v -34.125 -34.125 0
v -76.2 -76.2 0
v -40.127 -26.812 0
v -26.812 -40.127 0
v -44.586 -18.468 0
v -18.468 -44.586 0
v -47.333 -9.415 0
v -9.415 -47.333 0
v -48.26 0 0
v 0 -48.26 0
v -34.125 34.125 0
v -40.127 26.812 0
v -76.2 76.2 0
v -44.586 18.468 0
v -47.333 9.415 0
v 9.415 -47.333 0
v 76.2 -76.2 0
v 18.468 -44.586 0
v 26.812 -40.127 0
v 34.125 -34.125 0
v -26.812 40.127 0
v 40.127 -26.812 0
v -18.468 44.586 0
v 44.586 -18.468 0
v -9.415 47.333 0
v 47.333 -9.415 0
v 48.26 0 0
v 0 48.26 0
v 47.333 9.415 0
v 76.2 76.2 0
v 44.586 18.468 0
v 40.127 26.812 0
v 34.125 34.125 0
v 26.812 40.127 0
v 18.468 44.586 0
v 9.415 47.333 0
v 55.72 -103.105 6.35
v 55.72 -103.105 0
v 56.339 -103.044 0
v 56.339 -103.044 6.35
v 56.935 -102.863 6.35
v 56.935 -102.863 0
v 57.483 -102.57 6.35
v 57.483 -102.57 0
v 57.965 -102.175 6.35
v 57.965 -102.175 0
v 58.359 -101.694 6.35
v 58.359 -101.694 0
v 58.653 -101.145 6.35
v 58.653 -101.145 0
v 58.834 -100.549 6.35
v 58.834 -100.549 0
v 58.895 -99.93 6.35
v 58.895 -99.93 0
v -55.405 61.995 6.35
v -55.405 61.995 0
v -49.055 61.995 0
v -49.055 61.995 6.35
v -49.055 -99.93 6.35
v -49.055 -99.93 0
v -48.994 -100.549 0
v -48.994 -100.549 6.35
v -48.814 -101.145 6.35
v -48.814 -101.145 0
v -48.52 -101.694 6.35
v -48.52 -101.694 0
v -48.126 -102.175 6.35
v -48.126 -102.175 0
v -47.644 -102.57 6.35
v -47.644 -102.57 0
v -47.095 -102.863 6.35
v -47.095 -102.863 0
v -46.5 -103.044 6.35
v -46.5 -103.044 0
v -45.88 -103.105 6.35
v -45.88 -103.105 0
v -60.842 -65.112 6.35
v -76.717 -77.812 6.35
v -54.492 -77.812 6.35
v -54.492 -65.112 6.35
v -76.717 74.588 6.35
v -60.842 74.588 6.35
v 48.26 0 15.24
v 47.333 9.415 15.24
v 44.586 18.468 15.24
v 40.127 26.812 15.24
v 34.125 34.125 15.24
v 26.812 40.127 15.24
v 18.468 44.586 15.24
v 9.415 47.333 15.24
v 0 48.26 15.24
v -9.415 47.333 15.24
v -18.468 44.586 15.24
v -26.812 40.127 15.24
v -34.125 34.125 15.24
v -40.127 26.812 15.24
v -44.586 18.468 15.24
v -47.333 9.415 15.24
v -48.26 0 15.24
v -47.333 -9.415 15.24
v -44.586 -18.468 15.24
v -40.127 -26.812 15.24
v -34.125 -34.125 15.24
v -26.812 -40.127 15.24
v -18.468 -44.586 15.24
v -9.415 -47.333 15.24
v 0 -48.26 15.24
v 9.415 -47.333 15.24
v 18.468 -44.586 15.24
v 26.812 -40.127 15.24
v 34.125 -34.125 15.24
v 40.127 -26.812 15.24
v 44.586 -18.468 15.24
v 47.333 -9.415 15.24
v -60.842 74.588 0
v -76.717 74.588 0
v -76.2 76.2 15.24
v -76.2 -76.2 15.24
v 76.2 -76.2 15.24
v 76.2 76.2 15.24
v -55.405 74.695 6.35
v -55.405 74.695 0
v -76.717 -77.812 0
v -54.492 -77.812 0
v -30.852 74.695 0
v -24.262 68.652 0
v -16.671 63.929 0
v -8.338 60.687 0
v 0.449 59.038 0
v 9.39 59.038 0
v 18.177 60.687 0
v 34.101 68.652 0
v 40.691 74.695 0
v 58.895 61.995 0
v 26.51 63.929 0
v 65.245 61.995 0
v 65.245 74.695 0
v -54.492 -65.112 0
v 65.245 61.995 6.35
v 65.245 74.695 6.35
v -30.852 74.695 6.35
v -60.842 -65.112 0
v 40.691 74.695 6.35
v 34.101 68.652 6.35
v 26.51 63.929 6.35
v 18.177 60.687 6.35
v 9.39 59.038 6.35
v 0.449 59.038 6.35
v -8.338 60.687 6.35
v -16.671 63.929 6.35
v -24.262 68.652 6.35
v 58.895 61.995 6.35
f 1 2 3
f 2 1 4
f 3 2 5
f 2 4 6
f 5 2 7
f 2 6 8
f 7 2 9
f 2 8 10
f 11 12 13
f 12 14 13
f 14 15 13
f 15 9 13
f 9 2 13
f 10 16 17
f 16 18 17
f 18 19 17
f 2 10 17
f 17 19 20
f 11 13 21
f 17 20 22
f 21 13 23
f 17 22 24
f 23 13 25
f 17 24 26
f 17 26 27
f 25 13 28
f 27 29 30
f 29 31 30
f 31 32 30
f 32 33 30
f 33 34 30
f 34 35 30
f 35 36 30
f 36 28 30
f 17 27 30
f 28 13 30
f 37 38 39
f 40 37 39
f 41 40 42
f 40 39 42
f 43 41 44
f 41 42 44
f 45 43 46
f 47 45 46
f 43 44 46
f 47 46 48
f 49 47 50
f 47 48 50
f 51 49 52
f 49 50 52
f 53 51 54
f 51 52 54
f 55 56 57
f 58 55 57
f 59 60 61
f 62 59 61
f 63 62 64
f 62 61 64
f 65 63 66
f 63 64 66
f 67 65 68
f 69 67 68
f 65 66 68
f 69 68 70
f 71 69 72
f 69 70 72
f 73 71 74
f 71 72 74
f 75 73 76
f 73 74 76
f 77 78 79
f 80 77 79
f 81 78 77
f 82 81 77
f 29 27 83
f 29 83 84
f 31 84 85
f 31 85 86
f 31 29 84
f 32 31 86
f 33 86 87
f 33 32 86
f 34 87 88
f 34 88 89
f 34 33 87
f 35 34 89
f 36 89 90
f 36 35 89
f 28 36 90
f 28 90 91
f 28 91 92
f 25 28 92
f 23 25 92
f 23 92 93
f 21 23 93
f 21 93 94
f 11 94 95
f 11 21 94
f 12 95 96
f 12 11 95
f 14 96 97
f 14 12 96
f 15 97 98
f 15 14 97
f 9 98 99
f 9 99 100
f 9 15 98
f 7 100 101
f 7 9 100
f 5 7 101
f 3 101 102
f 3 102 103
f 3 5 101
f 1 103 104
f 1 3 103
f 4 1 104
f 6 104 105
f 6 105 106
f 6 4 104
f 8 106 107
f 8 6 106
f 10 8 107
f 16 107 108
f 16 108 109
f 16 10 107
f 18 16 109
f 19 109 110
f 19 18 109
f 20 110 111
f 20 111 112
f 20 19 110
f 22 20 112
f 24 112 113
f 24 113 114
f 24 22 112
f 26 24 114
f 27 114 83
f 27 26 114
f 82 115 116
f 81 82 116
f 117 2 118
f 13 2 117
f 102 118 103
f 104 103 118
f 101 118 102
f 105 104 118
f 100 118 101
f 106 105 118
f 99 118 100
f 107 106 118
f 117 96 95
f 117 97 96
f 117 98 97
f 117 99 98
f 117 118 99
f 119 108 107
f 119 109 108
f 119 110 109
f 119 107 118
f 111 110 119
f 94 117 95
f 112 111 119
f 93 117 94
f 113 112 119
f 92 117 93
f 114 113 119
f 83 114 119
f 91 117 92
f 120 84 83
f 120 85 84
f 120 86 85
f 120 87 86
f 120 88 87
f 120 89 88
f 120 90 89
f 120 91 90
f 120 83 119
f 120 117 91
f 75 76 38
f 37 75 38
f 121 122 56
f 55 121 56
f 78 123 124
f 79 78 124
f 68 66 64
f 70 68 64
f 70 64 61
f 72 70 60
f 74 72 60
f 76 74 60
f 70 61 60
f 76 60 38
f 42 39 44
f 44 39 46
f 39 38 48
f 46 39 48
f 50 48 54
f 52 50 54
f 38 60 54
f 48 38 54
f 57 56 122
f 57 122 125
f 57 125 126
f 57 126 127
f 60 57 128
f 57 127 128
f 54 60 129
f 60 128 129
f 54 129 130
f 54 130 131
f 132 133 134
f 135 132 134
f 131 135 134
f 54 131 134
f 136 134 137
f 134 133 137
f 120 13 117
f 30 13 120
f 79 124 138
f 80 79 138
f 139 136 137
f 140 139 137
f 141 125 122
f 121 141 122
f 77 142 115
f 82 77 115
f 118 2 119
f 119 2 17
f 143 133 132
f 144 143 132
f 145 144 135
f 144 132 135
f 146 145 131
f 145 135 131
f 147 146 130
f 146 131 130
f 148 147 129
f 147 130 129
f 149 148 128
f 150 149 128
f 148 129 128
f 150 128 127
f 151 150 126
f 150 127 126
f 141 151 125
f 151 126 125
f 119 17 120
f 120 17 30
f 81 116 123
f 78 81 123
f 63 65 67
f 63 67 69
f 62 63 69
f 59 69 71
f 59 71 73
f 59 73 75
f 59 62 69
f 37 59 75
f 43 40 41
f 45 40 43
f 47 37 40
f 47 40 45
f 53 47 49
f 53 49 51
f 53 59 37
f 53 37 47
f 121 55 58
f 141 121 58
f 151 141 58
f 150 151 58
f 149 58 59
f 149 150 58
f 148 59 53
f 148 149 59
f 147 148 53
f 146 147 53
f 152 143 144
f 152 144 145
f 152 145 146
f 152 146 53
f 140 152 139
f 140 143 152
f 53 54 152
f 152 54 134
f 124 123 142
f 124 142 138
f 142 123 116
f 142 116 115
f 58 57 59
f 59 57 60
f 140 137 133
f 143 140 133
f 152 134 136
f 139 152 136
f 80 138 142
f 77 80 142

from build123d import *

# Parameters (mm, degrees)
F0_W     = 152.4
F0_H     = 152.4
F0_R     = 48.26
F3_DEPTH = 15.24
F4_DEPTH = 6.35
F5_DEPTH = 6.35


with BuildPart() as f3:
    # F0 (on Top) → F3 (new body)
    with BuildSketch(Plane.XY):
        Rectangle(F0_W, F0_H)
        Circle(F0_R, mode=Mode.SUBTRACT)
    extrude(amount=F3_DEPTH)


with BuildPart() as f4:
    # F1 (on Top) → F4 (new body)
    with BuildSketch(Plane.XY):
        with BuildLine():
            Line((-30.851894, 74.695191), (-49.055474, 74.695191))
            Line((-49.055474, 74.695191), (-55.405474, 74.695191))
            Line((-55.405474, 74.695191), (-55.405474, 61.995191))
            Line((-55.405474, 61.995191), (-49.055474, 61.995191))
            Line((-49.055474, 61.995191), (-49.055474, -99.929809))
            ThreePointArc((-49.055474, -99.929809), (-48.125538, -102.174873), (-45.880474, -103.104809))
            Line((-45.880474, -103.104809), (55.719526, -103.104809))
            ThreePointArc((55.719526, -103.104809), (57.96459, -102.174873), (58.894526, -99.929809))
            Line((58.894526, -99.929809), (58.894526, 61.995191))
            Line((58.894526, 61.995191), (65.244526, 61.995191))
            Line((65.244526, 61.995191), (65.244526, 74.695191))
            Line((65.244526, 74.695191), (58.894526, 74.695191))
            Line((58.894526, 74.695191), (40.690947, 74.695191))
            ThreePointArc((40.690947, 74.695191), (4.919526, 58.830145), (-30.851894, 74.695191))
        make_face()
    extrude(amount=F4_DEPTH)


with BuildPart() as f5:
    # F2 (on Top) → F5 (new body)
    with BuildSketch(Plane.XY):
        Polygon((-60.842362, 74.588478), (-76.717362, 74.588478), (-76.717362, -77.811522), (-60.842362, -77.811522), (-54.492362, -77.811522), (-54.492362, -65.111522), (-60.842362, -65.111522), align=None)
    extrude(amount=F5_DEPTH)


solid = Compound([f3.part, f4.part, f5.part])
